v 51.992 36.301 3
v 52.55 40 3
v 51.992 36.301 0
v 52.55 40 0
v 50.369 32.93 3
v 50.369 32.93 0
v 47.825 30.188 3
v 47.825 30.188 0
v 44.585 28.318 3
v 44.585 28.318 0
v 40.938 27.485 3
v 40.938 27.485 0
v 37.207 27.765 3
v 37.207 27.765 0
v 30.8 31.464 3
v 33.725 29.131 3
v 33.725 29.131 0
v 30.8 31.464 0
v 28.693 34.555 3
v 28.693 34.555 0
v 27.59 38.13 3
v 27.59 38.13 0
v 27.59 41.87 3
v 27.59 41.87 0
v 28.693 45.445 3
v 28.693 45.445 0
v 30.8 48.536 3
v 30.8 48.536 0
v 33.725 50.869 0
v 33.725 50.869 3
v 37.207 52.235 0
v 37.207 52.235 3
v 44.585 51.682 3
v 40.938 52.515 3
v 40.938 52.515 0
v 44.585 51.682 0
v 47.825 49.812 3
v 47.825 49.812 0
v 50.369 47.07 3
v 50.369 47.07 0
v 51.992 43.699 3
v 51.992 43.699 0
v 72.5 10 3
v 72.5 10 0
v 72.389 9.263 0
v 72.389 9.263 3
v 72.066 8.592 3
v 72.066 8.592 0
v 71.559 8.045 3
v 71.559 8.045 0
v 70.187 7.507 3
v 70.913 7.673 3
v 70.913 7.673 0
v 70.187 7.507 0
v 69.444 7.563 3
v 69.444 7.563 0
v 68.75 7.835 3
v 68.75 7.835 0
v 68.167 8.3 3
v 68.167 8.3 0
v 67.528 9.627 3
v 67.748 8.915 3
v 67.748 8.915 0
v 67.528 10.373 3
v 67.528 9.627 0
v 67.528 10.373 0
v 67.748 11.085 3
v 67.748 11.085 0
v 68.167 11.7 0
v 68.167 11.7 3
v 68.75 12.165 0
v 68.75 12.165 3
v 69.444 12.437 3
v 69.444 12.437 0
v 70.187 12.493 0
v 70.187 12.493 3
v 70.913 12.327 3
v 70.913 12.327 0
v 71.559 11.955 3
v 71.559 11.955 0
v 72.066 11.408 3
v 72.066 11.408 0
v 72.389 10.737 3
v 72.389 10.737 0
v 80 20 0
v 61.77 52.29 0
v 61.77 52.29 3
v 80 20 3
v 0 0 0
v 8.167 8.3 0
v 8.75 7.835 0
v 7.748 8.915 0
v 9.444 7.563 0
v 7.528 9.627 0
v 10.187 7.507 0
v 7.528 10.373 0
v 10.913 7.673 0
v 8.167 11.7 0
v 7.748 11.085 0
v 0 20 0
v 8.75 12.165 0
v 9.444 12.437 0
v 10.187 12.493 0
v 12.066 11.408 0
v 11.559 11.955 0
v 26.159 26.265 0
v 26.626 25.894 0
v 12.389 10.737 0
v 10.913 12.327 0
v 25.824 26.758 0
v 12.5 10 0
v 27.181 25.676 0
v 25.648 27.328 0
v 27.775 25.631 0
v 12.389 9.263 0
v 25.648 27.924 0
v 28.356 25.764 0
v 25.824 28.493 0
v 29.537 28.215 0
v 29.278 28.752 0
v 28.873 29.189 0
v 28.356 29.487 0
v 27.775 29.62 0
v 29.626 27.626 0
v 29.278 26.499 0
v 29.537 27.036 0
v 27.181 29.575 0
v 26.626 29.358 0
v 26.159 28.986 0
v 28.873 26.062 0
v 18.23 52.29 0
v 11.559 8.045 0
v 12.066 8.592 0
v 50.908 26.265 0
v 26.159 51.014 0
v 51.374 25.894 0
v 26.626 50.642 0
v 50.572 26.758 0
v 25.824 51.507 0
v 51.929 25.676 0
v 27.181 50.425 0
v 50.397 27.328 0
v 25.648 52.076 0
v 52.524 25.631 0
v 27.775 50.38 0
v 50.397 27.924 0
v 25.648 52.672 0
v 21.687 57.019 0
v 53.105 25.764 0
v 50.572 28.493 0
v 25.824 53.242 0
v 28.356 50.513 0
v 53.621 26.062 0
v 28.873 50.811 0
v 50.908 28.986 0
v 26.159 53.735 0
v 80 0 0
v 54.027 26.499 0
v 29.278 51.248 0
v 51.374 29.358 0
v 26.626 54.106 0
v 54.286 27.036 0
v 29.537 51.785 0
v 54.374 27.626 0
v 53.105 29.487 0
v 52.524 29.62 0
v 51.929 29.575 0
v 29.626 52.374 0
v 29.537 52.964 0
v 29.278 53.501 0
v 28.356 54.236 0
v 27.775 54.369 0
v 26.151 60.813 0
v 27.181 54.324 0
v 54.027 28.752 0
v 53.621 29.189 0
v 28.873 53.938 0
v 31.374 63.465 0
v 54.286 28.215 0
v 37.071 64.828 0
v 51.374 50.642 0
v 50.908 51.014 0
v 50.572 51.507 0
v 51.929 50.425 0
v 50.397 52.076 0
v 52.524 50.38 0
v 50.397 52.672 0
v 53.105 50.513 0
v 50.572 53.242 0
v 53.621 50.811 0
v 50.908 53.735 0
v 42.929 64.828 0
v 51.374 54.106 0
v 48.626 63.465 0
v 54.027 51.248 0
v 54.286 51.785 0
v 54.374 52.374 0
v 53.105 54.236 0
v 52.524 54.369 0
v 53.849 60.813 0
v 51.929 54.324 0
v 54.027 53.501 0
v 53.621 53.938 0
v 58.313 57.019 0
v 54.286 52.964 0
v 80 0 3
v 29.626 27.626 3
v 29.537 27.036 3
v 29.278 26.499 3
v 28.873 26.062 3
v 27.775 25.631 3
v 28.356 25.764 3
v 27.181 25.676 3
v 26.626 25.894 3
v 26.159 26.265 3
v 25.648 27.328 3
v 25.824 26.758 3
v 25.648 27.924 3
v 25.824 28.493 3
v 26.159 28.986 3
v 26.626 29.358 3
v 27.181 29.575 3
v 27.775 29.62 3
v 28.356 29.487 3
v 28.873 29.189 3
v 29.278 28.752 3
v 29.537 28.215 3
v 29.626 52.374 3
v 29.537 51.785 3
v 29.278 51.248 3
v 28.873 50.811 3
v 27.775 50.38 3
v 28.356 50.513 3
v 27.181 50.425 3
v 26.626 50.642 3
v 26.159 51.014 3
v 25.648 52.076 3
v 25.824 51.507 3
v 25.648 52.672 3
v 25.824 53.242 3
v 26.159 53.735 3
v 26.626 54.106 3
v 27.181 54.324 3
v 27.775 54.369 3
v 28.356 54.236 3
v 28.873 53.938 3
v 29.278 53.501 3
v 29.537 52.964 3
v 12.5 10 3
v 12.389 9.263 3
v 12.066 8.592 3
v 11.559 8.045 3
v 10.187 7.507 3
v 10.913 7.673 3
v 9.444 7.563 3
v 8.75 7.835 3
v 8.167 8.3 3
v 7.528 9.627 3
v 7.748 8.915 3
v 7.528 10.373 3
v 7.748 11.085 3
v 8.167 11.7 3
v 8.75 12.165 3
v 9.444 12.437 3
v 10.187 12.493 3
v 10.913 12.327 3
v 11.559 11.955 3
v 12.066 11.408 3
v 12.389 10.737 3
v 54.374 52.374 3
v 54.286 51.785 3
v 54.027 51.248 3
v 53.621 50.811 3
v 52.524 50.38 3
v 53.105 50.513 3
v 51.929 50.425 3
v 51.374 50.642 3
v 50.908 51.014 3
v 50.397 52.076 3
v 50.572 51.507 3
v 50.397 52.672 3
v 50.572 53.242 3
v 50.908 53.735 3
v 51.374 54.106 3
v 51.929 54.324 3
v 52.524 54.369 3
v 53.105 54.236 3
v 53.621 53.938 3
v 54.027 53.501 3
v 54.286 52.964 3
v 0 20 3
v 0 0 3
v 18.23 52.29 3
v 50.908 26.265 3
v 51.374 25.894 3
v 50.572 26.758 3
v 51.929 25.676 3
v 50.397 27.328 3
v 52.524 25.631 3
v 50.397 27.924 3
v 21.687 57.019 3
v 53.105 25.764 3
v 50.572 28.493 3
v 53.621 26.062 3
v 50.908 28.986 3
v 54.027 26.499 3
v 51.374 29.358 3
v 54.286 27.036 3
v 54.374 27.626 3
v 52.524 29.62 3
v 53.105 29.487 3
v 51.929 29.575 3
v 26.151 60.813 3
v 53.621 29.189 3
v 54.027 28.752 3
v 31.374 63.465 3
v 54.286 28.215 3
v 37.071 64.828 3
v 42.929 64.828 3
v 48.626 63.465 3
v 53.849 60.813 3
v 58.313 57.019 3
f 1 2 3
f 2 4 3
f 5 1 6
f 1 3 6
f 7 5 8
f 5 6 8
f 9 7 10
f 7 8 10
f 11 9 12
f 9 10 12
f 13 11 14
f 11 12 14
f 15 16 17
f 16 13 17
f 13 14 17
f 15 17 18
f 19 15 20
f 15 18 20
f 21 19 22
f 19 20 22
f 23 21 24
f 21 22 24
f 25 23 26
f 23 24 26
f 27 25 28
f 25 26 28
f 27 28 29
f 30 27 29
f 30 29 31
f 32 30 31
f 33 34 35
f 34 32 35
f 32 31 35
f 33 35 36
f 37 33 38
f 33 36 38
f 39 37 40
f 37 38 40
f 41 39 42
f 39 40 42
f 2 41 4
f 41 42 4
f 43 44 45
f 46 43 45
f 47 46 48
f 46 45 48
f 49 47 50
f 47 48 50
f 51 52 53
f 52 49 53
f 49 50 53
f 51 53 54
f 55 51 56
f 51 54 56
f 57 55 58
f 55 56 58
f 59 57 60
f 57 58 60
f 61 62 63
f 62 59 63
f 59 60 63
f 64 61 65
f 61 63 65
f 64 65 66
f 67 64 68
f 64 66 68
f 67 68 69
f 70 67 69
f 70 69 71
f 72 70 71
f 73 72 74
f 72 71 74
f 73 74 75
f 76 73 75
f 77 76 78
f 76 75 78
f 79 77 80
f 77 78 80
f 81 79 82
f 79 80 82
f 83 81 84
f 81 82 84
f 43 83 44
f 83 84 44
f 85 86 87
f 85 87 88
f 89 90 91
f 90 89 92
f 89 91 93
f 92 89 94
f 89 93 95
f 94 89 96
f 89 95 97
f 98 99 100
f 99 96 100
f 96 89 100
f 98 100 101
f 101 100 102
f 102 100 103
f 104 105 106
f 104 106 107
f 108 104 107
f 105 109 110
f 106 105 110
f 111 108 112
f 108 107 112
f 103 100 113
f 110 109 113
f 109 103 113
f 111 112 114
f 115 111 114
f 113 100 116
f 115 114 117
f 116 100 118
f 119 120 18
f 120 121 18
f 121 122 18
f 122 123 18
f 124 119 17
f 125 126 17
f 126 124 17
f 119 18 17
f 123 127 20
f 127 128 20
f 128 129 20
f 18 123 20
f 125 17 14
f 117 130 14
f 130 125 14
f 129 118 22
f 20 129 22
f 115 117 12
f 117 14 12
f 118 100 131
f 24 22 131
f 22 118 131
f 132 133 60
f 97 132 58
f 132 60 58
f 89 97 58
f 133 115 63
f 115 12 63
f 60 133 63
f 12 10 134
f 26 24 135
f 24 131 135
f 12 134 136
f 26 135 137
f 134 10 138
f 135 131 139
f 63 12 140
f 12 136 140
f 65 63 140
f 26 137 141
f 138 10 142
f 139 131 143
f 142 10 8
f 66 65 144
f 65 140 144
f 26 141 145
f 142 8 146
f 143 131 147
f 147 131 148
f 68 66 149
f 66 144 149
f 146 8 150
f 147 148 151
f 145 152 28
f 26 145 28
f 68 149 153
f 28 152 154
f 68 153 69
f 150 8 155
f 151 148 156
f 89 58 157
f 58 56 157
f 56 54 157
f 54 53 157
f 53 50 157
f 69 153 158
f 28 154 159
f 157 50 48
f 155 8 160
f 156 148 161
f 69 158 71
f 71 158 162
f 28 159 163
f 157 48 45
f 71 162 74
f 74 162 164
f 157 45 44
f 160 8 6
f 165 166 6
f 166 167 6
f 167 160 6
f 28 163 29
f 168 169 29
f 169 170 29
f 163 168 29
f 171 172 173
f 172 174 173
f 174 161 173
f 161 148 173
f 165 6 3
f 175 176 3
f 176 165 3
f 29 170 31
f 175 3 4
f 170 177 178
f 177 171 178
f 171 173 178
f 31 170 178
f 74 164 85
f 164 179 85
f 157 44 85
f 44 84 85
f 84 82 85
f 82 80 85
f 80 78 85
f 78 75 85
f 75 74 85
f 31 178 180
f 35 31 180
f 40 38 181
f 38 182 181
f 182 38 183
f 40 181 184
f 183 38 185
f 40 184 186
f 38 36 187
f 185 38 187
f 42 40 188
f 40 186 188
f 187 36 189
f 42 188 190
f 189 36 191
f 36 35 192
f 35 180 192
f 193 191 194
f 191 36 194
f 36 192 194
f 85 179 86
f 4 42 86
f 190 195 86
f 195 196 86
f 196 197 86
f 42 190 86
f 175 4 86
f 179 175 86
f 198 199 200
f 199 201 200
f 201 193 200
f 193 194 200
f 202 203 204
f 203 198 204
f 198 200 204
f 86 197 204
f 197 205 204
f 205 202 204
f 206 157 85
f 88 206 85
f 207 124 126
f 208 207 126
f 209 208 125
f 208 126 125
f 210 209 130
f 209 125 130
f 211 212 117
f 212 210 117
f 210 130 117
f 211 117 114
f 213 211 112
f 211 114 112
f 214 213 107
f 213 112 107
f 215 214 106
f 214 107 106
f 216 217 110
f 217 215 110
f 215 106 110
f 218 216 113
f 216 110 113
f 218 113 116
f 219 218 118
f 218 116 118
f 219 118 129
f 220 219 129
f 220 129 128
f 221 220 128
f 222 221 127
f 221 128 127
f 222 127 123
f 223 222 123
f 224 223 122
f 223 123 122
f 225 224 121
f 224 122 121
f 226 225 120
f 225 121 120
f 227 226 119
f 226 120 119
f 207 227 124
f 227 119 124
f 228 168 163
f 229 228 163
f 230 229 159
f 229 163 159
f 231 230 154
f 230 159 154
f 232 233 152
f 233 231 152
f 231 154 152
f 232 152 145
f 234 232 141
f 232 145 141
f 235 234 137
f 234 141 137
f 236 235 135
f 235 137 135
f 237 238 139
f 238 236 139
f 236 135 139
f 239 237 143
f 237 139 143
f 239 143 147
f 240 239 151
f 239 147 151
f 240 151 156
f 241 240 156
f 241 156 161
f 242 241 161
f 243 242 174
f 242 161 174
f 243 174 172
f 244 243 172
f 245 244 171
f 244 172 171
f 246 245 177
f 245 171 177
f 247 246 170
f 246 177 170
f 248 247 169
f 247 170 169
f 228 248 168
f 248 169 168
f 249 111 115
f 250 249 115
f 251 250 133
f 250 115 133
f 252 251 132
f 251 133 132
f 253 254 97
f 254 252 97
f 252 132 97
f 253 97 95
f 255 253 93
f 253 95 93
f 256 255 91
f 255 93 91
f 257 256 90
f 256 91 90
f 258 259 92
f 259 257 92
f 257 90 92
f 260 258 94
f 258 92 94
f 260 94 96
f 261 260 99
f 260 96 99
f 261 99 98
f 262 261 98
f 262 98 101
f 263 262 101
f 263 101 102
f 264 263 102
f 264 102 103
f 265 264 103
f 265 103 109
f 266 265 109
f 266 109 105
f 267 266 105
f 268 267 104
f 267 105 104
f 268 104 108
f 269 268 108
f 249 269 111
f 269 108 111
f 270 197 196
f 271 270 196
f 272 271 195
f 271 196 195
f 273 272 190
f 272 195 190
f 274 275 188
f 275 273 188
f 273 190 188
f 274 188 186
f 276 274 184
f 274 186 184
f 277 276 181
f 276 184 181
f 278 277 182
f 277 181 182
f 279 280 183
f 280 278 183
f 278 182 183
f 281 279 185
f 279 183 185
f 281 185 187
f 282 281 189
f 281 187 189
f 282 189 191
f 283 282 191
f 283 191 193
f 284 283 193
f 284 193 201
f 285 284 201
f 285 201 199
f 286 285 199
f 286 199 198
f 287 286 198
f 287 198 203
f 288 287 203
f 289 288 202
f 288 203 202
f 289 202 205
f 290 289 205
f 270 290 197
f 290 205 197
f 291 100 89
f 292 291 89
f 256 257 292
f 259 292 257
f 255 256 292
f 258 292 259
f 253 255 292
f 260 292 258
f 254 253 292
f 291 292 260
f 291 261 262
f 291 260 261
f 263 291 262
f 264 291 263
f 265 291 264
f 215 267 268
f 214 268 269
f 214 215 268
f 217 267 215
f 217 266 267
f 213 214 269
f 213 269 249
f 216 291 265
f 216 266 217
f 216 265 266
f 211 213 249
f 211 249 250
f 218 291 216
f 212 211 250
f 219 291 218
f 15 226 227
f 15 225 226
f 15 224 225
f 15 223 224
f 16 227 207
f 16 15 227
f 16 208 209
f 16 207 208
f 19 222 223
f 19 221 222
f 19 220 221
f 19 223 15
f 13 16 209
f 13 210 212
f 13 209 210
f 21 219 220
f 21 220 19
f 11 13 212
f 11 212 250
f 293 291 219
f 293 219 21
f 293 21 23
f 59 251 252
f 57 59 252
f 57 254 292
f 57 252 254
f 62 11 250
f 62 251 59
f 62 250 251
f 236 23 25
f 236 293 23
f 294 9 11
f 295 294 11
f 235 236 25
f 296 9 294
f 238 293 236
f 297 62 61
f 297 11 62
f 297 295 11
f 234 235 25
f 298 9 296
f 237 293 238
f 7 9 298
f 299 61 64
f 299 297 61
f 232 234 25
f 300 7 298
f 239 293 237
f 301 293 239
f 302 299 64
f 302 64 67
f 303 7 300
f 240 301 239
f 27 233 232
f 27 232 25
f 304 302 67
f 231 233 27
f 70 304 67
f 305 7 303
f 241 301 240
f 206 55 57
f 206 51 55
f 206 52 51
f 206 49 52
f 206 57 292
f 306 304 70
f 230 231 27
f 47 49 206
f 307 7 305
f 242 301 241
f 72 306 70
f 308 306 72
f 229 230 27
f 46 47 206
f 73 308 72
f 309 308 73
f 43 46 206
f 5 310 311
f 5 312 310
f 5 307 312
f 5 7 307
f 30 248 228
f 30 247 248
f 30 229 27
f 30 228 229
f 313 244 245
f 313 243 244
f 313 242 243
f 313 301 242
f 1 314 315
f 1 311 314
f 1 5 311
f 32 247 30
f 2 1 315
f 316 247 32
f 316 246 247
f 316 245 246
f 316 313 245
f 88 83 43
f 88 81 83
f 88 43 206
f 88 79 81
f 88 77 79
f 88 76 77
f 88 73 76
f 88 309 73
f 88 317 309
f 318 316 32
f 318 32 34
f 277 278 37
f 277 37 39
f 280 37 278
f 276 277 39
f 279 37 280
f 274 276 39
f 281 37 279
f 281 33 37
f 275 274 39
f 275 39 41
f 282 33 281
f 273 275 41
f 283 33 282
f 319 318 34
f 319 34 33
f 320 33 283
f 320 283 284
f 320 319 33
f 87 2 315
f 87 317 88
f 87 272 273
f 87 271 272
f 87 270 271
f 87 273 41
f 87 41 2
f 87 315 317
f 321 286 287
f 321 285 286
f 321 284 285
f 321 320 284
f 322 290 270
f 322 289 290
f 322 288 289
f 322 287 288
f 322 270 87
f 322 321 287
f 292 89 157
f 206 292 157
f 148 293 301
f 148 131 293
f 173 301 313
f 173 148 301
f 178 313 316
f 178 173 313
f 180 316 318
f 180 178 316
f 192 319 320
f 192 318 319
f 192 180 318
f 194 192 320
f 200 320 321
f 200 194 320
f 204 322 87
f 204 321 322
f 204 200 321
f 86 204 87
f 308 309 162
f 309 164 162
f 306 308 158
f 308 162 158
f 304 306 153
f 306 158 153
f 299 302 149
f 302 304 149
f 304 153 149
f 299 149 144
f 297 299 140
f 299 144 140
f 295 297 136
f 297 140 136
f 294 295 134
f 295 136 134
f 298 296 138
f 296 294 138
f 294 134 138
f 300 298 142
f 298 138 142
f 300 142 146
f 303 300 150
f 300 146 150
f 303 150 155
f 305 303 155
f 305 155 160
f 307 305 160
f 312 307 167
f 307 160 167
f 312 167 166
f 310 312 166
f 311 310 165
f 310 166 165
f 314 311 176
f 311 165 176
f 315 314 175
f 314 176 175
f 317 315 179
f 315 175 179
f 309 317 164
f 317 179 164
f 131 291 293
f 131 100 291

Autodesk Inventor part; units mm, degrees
ref_plane "YZ Plane" through (0, 0, 0) normal (1, 0, 0) x (0, 1, 0)
ref_plane "XZ Plane" through (0, 0, 0) normal (0, 1, 0) x (-1, 0, 0)
ref_plane "XY Plane" through (0, 0, 0) normal (0, 0, 1) x (1, 0, 0)
sketch "スケッチ1" plane through (0, 0, 0) normal (0, 0, 1) x (1, 0, 0)
  line L0 (0, 0) -> (80, 0)
  line L1 (80, 0) -> (80, 20)
  line L2 (40, 0) -> (40, 90.8523) construction
  line L3 (0, 20) -> (0, 0)
  line L4 (0, 20) -> (18.2298, 52.2905)
  line L5 (61.7702, 52.2905) -> (80, 20)
  arc A0 (61.7702, 52.2905) -> (18.2298, 52.2905) centre (40, 40) ccw
  circle A1 centre (40, 40) radius 12.55
  line L6 (0, 10) -> (80, 10) construction
  circle A2 centre (10, 10) radius 2.5
  circle A3 centre (70, 10) radius 2.5
  circle A4 centre (40, 40) radius 17.5 construction
  line L7 (0, 20) -> (80, 20) construction
  line L8 (40, 40) -> (52.3744, 52.3744) construction
  circle A5 centre (52.3744, 52.3744) radius 2
  circle A6 centre (27.6256, 52.3744) radius 2
  circle A7 centre (27.6256, 27.6256) radius 2
  circle A8 centre (52.3744, 27.6256) radius 2
  dimension "d11" = 35
  dimension "d0" = 20
  dimension "d2" = 80
  dimension "d3" = 25
  dimension "d4" = 40
  dimension "d5" = 25.1
  dimension "d6" = 5
  dimension "d7" = 10
  dimension "d17" = 45
  dimension "d18" = 4
  dimension "d21" = 360
extrude "押し出し2" add sketch "スケッチ1" along normal blind 3
properties part number "車軸受け板"
